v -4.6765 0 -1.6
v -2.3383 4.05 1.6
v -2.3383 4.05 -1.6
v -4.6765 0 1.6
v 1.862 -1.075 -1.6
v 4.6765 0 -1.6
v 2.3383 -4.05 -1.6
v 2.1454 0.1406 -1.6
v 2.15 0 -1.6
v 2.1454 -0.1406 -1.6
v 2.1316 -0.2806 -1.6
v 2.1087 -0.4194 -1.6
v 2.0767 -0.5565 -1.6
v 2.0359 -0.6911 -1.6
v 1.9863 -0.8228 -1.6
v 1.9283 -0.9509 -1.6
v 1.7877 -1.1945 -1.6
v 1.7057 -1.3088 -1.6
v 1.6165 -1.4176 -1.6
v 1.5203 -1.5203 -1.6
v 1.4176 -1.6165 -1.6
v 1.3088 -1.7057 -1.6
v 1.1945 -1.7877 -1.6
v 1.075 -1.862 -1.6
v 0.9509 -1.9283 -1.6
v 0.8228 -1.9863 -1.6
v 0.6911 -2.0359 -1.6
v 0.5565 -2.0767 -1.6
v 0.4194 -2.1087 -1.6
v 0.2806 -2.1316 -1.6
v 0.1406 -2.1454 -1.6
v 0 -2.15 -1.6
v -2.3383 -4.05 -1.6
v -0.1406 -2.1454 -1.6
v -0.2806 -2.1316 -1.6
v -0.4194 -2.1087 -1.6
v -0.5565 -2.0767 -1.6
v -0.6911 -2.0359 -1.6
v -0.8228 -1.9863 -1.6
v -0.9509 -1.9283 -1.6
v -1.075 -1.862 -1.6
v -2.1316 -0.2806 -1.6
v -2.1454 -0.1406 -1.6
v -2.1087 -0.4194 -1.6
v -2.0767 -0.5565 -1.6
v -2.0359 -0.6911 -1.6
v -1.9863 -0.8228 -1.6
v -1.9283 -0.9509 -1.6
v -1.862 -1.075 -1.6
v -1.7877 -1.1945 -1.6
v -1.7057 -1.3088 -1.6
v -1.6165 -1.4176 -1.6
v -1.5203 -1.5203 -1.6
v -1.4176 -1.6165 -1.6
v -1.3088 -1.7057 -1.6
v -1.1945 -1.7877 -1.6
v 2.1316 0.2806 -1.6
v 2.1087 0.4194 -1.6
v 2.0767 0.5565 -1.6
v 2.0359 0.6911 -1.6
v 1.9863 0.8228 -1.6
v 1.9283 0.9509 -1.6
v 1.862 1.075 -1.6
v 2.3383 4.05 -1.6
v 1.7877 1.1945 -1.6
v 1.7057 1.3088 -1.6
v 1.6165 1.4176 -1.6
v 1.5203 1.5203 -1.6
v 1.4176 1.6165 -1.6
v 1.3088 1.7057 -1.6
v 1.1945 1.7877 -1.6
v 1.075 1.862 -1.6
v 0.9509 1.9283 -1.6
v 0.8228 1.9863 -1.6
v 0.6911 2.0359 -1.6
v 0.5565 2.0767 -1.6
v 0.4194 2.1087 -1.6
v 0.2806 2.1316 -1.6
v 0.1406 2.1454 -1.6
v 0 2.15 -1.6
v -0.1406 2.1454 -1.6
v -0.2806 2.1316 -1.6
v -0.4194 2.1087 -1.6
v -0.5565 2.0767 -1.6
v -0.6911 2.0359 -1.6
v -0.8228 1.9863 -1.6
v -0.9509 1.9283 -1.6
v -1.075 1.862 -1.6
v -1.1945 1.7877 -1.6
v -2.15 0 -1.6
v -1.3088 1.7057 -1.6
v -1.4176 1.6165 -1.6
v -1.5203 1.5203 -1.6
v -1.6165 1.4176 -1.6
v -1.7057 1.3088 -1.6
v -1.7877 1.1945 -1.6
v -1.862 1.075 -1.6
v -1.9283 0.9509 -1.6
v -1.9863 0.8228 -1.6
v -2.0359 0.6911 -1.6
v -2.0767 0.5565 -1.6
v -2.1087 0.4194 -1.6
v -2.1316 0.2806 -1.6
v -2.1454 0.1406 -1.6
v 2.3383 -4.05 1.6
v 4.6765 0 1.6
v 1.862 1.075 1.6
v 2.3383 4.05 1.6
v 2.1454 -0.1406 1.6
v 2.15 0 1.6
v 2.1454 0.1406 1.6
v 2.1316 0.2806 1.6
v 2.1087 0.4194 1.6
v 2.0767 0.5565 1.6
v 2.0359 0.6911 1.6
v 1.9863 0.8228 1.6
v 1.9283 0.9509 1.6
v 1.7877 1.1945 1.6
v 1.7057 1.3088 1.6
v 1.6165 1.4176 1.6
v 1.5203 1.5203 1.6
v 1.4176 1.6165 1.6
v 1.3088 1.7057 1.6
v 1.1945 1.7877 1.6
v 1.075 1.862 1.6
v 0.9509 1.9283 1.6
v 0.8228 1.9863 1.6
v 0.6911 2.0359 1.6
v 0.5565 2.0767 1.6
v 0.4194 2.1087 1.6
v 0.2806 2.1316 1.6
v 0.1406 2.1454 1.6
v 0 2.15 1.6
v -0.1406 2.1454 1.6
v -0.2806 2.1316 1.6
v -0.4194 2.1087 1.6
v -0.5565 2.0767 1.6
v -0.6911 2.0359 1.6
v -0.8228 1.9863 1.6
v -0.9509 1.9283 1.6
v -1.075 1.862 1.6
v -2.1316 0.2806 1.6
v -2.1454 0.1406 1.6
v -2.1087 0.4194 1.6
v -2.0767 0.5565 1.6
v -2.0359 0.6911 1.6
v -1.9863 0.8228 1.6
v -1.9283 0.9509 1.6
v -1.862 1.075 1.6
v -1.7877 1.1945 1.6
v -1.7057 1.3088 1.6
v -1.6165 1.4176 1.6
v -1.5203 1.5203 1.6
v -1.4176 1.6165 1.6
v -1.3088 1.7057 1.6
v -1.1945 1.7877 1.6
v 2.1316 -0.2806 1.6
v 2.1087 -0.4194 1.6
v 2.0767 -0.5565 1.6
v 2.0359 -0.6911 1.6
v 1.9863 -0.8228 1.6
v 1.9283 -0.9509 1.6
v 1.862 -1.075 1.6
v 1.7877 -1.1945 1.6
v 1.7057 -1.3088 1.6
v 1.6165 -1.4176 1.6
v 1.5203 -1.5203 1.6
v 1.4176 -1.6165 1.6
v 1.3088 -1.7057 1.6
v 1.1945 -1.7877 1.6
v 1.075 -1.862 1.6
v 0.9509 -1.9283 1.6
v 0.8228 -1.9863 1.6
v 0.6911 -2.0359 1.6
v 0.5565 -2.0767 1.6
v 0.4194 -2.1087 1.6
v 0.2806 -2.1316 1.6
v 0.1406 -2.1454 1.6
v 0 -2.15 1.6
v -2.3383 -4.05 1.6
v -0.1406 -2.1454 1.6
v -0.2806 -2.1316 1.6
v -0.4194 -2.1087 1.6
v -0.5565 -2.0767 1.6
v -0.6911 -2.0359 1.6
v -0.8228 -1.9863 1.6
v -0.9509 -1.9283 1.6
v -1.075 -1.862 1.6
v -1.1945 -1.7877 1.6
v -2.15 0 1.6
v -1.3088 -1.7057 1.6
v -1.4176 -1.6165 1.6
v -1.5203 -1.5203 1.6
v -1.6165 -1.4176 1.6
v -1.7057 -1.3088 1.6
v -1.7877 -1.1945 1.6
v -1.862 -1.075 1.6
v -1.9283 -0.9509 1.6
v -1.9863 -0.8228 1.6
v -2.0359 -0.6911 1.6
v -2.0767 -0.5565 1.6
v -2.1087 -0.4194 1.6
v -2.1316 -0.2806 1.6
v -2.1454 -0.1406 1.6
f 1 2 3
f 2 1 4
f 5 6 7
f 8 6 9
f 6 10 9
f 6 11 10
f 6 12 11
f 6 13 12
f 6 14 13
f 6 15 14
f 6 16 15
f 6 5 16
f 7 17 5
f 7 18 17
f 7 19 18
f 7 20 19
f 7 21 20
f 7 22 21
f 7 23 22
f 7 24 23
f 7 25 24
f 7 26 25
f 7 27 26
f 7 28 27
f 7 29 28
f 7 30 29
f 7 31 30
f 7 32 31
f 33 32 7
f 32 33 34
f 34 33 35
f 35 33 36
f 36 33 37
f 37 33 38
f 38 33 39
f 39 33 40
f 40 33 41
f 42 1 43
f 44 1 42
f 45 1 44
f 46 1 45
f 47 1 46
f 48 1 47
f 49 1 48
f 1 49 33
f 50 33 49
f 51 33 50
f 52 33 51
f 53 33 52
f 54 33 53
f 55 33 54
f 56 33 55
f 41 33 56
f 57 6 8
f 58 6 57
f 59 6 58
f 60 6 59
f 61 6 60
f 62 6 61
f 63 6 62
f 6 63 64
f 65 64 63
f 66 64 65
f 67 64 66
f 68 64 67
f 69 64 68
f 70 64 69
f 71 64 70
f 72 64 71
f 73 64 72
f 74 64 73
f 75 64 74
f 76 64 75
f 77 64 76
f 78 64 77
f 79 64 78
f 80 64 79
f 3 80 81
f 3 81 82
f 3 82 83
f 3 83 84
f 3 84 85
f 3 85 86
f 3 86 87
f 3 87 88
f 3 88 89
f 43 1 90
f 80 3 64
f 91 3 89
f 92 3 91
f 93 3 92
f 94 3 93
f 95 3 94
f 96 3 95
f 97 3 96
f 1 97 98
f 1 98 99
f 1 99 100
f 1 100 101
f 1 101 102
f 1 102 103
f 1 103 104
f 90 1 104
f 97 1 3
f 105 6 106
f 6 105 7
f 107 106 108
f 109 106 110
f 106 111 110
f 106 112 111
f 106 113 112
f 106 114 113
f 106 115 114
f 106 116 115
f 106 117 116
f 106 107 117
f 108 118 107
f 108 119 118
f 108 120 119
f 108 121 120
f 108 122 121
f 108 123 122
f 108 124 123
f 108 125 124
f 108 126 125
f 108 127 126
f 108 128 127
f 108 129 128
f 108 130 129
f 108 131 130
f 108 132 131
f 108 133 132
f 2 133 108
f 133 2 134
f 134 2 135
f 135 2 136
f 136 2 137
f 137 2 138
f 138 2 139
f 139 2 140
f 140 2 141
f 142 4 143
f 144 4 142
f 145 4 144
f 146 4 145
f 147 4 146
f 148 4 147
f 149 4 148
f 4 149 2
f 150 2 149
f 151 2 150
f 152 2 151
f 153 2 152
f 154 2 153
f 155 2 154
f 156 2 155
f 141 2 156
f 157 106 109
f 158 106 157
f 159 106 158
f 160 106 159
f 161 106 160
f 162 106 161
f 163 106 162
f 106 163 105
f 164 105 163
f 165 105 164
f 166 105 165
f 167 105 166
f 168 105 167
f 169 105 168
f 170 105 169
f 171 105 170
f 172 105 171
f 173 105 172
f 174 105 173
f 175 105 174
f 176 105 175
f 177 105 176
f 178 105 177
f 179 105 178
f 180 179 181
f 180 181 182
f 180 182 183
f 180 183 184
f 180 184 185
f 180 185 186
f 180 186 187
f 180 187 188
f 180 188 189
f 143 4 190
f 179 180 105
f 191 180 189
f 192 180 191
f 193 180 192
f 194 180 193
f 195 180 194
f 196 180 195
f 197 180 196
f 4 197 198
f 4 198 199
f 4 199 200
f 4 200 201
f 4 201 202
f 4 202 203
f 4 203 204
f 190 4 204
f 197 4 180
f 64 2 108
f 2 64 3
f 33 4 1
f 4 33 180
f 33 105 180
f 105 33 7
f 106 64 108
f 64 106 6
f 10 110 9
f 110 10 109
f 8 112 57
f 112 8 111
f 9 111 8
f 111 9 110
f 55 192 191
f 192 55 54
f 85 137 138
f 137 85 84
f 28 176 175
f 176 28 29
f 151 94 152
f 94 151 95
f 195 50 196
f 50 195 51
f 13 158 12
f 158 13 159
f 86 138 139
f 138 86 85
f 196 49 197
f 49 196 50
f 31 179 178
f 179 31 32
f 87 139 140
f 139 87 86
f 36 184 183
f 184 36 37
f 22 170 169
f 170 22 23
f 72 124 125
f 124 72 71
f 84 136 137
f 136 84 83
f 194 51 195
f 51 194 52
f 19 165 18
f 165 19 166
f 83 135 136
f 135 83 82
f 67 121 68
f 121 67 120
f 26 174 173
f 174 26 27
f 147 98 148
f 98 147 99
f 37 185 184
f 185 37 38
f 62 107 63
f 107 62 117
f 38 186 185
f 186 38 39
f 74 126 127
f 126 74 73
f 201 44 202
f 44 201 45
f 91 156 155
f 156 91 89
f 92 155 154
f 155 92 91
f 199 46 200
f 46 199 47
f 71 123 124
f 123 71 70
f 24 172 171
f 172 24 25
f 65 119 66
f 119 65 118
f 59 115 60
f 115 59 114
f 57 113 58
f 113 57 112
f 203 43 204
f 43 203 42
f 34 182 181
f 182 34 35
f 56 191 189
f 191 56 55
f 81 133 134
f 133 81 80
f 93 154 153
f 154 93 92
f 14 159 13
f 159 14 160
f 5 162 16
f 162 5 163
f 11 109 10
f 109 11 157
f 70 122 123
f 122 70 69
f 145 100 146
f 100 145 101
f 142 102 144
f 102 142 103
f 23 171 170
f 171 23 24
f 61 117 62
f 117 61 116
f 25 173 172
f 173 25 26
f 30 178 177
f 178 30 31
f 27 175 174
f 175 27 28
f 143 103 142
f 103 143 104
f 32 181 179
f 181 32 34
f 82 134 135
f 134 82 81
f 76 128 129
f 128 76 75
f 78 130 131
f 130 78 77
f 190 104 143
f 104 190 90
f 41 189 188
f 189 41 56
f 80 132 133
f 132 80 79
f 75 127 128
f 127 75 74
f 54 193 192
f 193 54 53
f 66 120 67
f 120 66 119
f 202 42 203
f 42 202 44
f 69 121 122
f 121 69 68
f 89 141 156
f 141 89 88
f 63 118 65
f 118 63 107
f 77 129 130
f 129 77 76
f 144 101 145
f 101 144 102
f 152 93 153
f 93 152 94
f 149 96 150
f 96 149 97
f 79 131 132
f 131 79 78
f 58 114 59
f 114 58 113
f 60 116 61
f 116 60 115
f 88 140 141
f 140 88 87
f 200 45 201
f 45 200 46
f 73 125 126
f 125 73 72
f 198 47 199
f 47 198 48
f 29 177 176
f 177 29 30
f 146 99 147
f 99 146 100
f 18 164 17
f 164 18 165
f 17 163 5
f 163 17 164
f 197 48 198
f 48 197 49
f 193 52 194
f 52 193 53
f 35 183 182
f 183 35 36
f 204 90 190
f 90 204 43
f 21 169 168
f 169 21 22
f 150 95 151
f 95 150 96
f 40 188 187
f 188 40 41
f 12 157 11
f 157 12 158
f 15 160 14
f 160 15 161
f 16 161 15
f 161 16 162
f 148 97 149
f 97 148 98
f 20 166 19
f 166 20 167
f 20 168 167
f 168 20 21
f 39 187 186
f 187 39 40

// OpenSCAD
// Hex nut for 4.0mm screws, 8.1mm across flats, 3.2mm thick (plain hex nut)

// Parameters (fixed to requested dimensions)
thread_diameter_mm = 4.0;
across_flats_mm    = 8.1;
thickness_mm       = 3.2;

// Hole sizing
clearance_extra_mm = 0.3;   // typical clearance for printed parts
eps_mm             = 0.2;   // small extra for clean boolean cuts

$fn = 96;

// Regular hex profile defined by across-flats (AF)
// For a regular hex, circumradius R = AF / sqrt(3)
module hex_prism_by_af(af, h, center=true) {
    R = af / sqrt(3);
    linear_extrude(height=h, center=center)
        polygon(points=[
            [ R, 0],
            [ R/2,  R*sqrt(3)/2],
            [-R/2,  R*sqrt(3)/2],
            [-R, 0],
            [-R/2, -R*sqrt(3)/2],
            [ R/2, -R*sqrt(3)/2]
        ]);
}

module hex_nut(af, h, hole_d) {
    difference() {
        hex_prism_by_af(af, h, center=true);
        cylinder(d=hole_d, h=h + 2*eps_mm, center=true);
    }
}

// Final model: ONE connected solid (no washer/flange)
hex_nut(
    af = across_flats_mm,
    h  = thickness_mm,
    hole_d = thread_diameter_mm + clearance_extra_mm
);
